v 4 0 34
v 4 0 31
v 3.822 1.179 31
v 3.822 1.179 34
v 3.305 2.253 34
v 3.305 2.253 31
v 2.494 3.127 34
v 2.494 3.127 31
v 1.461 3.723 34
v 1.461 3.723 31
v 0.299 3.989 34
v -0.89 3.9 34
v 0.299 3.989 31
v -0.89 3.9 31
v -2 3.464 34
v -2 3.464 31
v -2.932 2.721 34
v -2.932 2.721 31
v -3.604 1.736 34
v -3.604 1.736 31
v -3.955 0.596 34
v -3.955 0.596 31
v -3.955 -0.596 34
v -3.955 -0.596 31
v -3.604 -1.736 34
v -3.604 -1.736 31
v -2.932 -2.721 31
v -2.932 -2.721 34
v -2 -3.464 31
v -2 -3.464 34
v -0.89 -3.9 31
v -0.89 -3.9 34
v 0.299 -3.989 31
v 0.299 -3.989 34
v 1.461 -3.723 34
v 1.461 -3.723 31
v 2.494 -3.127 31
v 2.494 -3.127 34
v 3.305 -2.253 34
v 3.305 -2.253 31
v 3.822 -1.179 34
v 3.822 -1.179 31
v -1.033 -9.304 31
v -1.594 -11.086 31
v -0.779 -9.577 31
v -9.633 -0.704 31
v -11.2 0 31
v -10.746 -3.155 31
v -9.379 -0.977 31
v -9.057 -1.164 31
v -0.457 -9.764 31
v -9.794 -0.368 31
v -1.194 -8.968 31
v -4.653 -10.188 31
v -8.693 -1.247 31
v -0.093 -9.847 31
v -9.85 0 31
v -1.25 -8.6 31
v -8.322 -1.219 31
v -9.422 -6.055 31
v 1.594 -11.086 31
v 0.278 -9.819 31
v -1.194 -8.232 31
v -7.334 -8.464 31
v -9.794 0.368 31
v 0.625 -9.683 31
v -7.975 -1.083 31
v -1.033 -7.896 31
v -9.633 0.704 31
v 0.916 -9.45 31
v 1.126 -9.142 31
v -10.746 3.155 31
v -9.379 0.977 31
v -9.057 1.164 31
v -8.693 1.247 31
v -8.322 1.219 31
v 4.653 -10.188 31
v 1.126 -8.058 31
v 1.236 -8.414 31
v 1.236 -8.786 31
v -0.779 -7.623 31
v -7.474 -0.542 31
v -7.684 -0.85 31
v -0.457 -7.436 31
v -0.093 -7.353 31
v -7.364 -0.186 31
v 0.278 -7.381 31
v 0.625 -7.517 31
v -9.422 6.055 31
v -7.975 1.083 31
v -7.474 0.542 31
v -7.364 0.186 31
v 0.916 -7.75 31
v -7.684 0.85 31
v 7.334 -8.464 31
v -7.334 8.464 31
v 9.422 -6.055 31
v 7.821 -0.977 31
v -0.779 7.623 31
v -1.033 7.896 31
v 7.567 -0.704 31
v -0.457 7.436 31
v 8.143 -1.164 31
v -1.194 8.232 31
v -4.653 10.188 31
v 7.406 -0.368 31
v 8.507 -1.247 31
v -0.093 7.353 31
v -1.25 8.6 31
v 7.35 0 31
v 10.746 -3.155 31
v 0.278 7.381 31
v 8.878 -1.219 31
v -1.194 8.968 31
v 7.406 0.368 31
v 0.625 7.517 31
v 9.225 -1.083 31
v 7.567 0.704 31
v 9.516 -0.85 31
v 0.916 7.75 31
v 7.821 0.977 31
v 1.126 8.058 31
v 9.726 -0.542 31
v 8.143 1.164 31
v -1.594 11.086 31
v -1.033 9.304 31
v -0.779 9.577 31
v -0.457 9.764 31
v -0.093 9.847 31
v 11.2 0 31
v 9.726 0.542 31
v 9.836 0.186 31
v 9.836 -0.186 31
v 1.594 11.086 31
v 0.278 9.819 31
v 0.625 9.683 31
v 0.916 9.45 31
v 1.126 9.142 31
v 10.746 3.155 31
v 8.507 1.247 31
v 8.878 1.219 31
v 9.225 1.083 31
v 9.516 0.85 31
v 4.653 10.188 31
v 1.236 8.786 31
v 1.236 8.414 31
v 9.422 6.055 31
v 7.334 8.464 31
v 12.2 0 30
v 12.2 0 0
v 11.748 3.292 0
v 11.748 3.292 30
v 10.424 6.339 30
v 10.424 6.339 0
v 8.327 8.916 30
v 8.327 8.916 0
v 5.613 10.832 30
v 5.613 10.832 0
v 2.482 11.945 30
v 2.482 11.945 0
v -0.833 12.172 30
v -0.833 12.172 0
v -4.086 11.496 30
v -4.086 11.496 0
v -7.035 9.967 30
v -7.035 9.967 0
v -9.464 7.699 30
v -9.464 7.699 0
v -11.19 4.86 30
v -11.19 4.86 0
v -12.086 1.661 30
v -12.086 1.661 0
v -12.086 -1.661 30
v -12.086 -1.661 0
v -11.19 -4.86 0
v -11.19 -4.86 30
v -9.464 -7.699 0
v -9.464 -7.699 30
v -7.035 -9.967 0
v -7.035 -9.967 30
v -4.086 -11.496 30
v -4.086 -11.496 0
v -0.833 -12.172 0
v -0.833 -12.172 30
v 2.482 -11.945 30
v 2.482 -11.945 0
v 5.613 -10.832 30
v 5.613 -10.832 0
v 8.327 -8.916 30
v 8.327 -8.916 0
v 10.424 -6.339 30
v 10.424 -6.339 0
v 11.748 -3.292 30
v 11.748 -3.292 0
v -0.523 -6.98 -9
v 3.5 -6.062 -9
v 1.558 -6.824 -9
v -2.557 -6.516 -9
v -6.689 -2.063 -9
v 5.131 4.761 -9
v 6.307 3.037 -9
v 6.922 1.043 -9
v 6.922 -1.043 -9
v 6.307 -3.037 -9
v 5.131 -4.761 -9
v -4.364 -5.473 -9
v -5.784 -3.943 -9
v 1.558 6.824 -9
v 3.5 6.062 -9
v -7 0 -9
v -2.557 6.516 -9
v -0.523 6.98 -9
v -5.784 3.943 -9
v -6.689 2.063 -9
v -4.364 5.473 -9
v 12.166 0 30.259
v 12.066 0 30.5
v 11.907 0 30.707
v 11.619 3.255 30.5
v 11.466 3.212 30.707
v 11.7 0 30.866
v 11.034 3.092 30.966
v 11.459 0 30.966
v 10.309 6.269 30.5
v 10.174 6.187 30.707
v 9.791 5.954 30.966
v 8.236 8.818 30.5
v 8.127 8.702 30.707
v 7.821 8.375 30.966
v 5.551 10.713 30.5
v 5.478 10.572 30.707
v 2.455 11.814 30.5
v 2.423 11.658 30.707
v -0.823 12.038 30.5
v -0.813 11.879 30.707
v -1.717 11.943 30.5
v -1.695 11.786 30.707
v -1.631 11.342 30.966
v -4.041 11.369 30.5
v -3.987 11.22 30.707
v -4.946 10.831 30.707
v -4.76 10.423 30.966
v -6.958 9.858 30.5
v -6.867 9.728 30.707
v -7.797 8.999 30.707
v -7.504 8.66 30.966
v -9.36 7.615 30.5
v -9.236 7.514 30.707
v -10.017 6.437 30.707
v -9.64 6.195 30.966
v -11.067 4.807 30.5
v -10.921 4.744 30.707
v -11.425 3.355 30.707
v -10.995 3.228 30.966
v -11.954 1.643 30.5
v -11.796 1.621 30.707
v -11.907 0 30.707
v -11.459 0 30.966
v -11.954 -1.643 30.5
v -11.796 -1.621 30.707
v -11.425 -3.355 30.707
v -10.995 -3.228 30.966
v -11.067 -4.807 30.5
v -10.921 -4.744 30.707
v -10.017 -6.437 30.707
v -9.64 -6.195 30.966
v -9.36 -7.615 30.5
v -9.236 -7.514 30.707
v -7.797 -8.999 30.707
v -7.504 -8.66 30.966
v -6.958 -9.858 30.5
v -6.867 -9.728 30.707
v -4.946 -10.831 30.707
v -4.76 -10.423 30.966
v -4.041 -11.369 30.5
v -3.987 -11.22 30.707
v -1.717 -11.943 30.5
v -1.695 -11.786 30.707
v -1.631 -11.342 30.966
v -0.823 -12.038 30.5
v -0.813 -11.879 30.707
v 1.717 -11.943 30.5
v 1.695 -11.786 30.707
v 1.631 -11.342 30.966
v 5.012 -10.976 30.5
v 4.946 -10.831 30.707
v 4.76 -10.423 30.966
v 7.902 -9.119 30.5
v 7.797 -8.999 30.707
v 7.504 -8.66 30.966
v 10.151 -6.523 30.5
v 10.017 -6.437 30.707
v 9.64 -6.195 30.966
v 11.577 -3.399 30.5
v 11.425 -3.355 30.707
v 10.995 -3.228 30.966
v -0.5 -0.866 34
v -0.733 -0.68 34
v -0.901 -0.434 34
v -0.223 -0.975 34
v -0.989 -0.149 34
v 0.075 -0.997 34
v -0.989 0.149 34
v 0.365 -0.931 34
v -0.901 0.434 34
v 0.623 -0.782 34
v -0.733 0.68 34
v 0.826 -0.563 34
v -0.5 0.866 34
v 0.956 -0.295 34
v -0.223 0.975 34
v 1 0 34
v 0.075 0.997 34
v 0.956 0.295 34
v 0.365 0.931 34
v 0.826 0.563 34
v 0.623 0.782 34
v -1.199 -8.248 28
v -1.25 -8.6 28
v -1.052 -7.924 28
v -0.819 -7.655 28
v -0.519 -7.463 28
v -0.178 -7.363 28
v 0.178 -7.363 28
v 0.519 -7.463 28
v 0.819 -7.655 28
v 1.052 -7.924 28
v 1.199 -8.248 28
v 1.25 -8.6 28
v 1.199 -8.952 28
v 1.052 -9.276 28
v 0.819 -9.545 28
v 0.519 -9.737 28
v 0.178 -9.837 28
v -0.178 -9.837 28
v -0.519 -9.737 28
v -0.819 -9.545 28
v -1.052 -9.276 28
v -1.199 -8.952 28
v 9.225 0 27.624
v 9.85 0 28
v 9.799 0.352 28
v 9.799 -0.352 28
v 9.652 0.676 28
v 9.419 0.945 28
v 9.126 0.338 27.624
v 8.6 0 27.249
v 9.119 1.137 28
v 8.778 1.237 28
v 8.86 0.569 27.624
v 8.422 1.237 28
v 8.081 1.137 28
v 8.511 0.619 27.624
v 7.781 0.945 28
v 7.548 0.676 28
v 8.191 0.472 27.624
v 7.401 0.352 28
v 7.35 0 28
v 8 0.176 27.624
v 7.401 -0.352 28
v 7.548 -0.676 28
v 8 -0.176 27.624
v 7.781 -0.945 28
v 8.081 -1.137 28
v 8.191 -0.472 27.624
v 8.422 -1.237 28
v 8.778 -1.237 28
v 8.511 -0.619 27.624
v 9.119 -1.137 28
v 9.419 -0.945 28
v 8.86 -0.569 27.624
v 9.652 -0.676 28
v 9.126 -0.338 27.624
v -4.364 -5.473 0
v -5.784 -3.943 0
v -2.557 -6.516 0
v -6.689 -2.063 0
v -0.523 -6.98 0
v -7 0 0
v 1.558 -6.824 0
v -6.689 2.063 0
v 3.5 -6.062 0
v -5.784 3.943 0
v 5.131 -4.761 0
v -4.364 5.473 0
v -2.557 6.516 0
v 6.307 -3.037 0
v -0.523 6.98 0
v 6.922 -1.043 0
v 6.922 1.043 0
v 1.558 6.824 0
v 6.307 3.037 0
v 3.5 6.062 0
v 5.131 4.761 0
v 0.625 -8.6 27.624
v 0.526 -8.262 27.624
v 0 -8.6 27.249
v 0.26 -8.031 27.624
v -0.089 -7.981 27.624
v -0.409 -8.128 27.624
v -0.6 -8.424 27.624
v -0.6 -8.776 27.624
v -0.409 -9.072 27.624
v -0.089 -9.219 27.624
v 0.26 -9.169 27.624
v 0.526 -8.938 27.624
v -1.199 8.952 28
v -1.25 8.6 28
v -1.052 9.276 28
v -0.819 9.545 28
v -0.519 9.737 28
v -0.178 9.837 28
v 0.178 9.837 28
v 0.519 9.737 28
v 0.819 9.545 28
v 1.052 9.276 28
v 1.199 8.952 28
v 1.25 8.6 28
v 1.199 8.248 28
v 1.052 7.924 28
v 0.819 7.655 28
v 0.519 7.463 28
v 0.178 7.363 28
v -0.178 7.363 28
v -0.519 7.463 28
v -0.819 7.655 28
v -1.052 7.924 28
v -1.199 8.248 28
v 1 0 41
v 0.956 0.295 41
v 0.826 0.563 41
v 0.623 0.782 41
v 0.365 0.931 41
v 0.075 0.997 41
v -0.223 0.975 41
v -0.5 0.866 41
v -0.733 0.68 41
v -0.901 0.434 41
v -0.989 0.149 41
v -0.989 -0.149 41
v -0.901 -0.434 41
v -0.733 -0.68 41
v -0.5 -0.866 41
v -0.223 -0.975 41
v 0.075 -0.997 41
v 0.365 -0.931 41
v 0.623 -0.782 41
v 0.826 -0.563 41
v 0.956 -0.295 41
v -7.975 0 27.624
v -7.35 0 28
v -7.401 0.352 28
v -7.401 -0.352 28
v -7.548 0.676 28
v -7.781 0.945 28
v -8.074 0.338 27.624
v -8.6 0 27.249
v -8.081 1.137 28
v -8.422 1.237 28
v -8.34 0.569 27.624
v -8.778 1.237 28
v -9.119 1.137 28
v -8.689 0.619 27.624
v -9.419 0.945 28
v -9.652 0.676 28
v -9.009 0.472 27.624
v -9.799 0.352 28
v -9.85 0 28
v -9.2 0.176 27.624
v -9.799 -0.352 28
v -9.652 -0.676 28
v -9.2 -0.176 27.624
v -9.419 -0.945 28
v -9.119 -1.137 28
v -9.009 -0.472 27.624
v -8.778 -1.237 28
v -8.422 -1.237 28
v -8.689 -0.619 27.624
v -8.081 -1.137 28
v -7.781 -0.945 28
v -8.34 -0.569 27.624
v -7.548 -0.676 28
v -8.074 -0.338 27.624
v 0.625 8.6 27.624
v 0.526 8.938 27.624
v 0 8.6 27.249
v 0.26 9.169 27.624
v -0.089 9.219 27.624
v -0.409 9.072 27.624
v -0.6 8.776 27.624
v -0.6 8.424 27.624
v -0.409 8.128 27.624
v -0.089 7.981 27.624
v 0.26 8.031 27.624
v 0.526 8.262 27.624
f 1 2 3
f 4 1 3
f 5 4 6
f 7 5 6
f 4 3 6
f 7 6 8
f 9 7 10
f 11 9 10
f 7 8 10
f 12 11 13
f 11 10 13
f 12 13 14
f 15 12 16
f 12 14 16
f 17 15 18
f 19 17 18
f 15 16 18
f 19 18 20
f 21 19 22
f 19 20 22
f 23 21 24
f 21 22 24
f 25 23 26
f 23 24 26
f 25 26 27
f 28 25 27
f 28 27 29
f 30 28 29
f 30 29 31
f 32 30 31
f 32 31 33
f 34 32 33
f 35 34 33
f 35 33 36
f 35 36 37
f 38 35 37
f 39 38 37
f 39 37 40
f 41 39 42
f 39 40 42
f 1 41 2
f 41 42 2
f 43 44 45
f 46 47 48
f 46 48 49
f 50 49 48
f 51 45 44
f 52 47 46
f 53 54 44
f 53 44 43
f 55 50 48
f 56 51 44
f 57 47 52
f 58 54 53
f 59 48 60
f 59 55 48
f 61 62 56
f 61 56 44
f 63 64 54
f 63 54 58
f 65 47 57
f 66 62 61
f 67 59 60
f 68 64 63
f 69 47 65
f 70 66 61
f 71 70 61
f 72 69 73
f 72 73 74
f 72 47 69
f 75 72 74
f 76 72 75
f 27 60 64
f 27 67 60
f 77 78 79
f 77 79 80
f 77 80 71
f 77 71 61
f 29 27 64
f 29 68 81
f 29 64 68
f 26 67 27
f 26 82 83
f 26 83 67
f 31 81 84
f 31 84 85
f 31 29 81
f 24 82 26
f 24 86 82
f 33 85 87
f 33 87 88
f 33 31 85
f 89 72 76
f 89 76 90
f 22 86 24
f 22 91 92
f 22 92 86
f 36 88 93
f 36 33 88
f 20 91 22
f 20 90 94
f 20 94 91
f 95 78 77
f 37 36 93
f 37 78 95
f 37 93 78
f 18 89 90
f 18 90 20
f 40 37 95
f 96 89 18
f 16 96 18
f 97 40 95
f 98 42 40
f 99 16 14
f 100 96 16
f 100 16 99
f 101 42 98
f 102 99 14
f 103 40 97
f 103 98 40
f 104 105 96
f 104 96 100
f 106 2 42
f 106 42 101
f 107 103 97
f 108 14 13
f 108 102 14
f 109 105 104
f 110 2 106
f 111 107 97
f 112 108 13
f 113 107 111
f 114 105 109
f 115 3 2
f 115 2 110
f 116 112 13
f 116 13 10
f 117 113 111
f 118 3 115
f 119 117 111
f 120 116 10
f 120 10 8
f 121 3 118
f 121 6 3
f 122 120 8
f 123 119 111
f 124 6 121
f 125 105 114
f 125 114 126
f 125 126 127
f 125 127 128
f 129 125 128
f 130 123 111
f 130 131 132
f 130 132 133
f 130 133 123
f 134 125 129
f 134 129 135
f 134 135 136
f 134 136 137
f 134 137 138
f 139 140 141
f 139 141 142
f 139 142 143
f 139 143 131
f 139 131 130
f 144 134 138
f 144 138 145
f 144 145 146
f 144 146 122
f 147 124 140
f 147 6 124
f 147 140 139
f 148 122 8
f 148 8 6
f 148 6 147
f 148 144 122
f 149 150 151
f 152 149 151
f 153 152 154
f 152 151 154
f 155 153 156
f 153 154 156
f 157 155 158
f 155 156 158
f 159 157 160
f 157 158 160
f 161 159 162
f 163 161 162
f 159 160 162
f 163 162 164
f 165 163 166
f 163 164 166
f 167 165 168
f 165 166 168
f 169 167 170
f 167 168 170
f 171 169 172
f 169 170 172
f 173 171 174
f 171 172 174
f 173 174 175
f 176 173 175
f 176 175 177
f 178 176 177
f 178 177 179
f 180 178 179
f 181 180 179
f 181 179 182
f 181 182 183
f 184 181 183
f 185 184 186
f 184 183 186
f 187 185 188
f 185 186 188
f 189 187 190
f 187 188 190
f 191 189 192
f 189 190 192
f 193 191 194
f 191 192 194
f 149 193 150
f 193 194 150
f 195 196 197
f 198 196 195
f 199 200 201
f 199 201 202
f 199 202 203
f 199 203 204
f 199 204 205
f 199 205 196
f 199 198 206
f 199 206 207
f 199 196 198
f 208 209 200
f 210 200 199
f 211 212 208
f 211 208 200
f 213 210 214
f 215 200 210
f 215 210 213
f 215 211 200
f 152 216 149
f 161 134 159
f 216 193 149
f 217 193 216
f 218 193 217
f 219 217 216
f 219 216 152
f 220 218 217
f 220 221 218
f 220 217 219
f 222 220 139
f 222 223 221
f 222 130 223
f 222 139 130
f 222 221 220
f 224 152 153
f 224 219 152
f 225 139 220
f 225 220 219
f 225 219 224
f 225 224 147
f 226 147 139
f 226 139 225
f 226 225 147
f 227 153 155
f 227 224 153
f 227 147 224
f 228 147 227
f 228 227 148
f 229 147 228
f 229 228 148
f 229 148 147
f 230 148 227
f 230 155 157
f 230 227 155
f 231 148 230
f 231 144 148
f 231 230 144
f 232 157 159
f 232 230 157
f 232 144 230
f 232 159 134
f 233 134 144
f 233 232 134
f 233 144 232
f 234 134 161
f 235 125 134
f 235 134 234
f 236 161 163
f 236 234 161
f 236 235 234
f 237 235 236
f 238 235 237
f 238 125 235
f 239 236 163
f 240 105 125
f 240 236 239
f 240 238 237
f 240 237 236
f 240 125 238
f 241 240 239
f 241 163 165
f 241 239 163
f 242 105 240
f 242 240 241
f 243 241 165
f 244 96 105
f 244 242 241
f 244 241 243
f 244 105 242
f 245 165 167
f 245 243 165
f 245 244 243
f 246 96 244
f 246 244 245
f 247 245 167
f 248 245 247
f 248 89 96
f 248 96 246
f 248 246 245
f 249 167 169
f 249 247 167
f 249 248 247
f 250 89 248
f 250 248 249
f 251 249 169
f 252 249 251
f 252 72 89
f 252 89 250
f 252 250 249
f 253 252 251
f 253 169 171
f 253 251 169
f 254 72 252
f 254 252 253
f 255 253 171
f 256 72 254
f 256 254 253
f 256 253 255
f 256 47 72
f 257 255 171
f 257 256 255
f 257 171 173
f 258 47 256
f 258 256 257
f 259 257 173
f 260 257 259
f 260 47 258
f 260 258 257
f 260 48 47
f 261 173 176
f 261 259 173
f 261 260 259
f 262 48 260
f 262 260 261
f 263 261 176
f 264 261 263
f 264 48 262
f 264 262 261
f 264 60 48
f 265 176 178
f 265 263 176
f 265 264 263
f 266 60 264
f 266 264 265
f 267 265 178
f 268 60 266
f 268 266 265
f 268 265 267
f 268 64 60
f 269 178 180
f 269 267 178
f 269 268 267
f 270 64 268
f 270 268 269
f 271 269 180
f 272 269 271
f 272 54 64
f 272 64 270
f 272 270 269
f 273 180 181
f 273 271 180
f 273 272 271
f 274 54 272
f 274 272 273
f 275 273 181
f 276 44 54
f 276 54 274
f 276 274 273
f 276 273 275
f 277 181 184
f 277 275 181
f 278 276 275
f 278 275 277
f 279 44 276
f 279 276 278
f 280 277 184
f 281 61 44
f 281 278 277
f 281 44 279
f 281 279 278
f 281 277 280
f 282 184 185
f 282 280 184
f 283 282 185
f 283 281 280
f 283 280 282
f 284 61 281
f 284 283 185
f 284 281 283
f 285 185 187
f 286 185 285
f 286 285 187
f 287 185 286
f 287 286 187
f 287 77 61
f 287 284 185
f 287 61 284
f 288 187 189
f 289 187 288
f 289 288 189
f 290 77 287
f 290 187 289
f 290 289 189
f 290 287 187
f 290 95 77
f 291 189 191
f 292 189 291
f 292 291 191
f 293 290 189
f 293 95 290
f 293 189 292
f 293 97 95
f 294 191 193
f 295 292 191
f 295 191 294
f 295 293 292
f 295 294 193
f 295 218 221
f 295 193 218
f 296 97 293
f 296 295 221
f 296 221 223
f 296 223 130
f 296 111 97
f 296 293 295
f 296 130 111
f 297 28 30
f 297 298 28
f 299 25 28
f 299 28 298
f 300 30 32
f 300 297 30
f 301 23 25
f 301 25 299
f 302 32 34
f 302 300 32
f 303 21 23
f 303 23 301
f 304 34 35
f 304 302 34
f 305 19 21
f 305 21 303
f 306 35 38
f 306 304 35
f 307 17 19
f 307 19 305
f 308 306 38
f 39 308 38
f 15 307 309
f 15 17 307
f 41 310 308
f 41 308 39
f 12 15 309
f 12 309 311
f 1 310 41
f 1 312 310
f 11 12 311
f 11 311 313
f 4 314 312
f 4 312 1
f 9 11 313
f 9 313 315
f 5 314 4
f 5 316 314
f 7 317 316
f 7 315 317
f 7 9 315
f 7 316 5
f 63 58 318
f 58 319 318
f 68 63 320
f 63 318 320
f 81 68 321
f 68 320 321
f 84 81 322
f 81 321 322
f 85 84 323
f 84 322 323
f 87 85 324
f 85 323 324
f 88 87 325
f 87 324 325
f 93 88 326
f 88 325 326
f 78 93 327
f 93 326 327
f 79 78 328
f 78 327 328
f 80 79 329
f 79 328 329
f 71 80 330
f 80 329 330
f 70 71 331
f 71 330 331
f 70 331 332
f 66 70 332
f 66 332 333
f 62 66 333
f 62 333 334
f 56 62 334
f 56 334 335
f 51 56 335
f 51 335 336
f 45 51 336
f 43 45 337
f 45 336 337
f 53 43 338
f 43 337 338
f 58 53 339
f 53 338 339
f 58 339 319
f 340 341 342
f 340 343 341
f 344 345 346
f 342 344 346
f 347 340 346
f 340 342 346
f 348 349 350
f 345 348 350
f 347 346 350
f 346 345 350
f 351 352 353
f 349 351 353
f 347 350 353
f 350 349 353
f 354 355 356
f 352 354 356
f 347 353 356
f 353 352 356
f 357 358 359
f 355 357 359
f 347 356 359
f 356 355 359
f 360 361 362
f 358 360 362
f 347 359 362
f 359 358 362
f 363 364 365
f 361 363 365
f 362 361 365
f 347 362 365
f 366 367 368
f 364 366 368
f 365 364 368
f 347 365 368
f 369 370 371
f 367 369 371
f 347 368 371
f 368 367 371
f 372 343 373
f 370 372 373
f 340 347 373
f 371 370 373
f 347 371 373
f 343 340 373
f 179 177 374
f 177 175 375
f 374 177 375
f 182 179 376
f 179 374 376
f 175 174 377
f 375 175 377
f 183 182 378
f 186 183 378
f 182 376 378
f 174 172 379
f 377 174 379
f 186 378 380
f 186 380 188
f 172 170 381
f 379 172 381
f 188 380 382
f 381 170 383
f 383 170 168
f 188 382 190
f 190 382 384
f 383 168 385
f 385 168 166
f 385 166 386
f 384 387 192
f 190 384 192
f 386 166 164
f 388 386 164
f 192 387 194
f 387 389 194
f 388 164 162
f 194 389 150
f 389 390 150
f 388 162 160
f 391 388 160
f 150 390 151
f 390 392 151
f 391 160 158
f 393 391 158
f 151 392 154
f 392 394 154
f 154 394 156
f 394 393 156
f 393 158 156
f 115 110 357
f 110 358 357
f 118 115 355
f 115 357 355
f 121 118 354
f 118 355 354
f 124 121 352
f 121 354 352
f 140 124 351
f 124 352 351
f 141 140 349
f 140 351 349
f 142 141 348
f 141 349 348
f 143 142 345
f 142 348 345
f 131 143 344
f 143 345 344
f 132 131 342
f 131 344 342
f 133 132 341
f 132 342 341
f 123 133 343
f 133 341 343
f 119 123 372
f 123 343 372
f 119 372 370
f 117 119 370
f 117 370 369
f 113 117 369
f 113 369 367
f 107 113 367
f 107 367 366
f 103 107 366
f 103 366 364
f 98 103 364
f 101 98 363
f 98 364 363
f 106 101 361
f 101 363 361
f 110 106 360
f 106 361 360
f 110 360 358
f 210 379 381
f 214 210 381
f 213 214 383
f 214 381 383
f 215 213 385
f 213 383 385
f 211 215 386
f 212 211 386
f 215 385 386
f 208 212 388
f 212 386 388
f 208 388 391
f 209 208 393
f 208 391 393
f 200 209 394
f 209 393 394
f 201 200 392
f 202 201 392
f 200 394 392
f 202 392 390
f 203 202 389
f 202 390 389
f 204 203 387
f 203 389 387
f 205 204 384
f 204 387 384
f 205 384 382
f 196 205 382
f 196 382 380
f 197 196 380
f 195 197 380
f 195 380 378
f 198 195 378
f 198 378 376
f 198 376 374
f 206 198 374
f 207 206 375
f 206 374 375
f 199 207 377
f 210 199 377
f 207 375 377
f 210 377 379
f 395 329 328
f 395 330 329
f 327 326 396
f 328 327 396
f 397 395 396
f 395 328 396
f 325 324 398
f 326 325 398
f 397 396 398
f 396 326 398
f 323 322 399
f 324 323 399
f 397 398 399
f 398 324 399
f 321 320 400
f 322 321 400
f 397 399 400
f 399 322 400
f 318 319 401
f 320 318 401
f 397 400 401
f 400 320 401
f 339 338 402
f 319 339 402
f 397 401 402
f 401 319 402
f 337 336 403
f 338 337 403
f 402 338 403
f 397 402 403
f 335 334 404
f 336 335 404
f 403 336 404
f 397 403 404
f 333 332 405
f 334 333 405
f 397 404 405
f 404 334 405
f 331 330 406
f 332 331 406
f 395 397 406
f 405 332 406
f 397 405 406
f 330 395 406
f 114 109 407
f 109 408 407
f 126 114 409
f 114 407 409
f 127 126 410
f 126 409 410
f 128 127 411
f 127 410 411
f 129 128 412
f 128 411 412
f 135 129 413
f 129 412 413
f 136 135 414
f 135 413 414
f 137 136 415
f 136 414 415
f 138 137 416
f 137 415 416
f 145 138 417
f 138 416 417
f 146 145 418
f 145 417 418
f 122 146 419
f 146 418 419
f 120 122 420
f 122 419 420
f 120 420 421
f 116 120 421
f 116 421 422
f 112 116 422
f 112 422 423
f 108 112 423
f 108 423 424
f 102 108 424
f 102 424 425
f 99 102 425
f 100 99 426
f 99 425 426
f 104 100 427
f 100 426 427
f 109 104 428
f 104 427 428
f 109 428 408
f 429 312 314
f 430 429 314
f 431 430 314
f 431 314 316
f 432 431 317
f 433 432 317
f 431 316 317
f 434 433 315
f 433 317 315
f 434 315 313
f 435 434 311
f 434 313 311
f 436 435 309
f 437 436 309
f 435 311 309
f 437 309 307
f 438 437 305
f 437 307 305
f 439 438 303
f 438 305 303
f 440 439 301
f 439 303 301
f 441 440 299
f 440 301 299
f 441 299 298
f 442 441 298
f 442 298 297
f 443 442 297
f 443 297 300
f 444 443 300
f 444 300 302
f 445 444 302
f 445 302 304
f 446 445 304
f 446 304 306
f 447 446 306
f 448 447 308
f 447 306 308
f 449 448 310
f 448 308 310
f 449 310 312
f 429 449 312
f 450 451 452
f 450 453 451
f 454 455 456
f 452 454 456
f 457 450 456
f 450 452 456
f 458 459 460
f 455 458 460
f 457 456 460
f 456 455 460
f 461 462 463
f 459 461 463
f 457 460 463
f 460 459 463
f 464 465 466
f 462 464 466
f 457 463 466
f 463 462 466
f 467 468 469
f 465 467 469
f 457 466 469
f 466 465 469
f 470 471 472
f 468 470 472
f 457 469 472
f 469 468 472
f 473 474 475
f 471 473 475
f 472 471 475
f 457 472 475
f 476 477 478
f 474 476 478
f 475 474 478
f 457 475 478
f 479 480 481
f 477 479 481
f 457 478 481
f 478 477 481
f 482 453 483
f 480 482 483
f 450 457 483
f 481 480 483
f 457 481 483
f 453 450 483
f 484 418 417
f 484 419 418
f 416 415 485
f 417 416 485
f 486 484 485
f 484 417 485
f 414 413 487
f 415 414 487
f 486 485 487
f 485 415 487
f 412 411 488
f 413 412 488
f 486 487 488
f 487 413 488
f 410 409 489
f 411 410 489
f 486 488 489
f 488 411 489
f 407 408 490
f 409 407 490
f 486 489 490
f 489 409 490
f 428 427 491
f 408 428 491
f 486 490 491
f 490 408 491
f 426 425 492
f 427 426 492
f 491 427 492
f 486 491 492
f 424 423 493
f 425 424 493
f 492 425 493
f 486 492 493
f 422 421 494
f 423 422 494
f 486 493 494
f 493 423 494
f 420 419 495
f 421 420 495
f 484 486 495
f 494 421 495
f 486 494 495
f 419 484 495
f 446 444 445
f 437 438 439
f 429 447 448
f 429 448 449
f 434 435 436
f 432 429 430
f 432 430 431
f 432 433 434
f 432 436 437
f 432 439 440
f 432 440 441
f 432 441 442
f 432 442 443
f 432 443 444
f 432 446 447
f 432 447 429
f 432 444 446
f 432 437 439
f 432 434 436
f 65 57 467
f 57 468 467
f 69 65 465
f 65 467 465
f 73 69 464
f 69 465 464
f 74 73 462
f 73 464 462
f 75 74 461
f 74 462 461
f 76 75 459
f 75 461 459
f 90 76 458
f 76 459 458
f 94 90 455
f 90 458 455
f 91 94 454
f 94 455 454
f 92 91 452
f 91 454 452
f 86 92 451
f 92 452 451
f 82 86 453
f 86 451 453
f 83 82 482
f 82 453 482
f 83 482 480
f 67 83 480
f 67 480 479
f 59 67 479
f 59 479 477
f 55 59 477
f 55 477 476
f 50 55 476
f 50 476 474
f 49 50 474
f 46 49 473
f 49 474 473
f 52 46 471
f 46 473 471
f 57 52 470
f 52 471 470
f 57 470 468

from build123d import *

# Parameters (mm, degrees)
ESBO_O1_R                                   = 12.2
RESSALTO_EXTRUS_O1_DEPTH                    = 31
BROCA_DE_ROSQUEAR_PARA_TARRAXA_DE_M31_D     = 2.5
BROCA_DE_ROSQUEAR_PARA_TARRAXA_DE_M31_DEPTH = 3
BROCA_DE_ROSQUEAR_PARA_TARRAXA_DE_M31_TIP   = 0.751075774
ESBO_O5_R                                   = 4
RESSALTO_EXTRUS_O2_DEPTH                    = 3
ESBO_O6_R                                   = 1
RESSALTO_EXTRUS_O3_DEPTH                    = 7
ESBO_O7_R                                   = 7
RESSALTO_EXTRUS_O4_DEPTH                    = 9
FILETE1_R                                   = 1


with BuildPart() as part:
    # Esboço1 → Ressalto-extrusão1 (new body)
    with BuildSketch(Plane.XY):
        Circle(ESBO_O1_R)
    extrude(amount=RESSALTO_EXTRUS_O1_DEPTH)

    # Broca de rosquear para tarraxa de M31
    with Locations(Plane(origin=(-8.6, 0, 31), x_dir=(1, 0, 0), z_dir=(0, 0, 1))):
        with Locations((0, 0), (8.6, 8.6), (17.2, 0), (8.6, -8.6)):
            Hole(BROCA_DE_ROSQUEAR_PARA_TARRAXA_DE_M31_D / 2, depth=BROCA_DE_ROSQUEAR_PARA_TARRAXA_DE_M31_DEPTH)
            with Locations((0, 0, -(BROCA_DE_ROSQUEAR_PARA_TARRAXA_DE_M31_DEPTH + BROCA_DE_ROSQUEAR_PARA_TARRAXA_DE_M31_TIP / 2))):  # 118° drill point
                Cone(0, BROCA_DE_ROSQUEAR_PARA_TARRAXA_DE_M31_D / 2, BROCA_DE_ROSQUEAR_PARA_TARRAXA_DE_M31_TIP, mode=Mode.SUBTRACT)

    # Esboço5 → Ressalto-extrusão2 (add)
    with BuildSketch(Plane.XY.offset(31)):
        Circle(ESBO_O5_R)
    extrude(amount=RESSALTO_EXTRUS_O2_DEPTH)

    # Esboço6 → Ressalto-extrusão3 (add)
    with BuildSketch(Plane.XY.offset(34)):
        Circle(ESBO_O6_R)
    extrude(amount=RESSALTO_EXTRUS_O3_DEPTH)

    # Esboço7 → Ressalto-extrusão4 (add)
    with BuildSketch(Plane(origin=(0, 0, 0), x_dir=(-1, 0, 0), z_dir=(0, 0, -1))):
        Circle(ESBO_O7_R)
    extrude(amount=RESSALTO_EXTRUS_O4_DEPTH)

    # Filete1
    filete1_edges = [part.edges().sort_by_distance(p)[0] for p in [
        (-12.2, 0, 31),
    ]]
    fillet(filete1_edges, radius=FILETE1_R)


solid = part.part
